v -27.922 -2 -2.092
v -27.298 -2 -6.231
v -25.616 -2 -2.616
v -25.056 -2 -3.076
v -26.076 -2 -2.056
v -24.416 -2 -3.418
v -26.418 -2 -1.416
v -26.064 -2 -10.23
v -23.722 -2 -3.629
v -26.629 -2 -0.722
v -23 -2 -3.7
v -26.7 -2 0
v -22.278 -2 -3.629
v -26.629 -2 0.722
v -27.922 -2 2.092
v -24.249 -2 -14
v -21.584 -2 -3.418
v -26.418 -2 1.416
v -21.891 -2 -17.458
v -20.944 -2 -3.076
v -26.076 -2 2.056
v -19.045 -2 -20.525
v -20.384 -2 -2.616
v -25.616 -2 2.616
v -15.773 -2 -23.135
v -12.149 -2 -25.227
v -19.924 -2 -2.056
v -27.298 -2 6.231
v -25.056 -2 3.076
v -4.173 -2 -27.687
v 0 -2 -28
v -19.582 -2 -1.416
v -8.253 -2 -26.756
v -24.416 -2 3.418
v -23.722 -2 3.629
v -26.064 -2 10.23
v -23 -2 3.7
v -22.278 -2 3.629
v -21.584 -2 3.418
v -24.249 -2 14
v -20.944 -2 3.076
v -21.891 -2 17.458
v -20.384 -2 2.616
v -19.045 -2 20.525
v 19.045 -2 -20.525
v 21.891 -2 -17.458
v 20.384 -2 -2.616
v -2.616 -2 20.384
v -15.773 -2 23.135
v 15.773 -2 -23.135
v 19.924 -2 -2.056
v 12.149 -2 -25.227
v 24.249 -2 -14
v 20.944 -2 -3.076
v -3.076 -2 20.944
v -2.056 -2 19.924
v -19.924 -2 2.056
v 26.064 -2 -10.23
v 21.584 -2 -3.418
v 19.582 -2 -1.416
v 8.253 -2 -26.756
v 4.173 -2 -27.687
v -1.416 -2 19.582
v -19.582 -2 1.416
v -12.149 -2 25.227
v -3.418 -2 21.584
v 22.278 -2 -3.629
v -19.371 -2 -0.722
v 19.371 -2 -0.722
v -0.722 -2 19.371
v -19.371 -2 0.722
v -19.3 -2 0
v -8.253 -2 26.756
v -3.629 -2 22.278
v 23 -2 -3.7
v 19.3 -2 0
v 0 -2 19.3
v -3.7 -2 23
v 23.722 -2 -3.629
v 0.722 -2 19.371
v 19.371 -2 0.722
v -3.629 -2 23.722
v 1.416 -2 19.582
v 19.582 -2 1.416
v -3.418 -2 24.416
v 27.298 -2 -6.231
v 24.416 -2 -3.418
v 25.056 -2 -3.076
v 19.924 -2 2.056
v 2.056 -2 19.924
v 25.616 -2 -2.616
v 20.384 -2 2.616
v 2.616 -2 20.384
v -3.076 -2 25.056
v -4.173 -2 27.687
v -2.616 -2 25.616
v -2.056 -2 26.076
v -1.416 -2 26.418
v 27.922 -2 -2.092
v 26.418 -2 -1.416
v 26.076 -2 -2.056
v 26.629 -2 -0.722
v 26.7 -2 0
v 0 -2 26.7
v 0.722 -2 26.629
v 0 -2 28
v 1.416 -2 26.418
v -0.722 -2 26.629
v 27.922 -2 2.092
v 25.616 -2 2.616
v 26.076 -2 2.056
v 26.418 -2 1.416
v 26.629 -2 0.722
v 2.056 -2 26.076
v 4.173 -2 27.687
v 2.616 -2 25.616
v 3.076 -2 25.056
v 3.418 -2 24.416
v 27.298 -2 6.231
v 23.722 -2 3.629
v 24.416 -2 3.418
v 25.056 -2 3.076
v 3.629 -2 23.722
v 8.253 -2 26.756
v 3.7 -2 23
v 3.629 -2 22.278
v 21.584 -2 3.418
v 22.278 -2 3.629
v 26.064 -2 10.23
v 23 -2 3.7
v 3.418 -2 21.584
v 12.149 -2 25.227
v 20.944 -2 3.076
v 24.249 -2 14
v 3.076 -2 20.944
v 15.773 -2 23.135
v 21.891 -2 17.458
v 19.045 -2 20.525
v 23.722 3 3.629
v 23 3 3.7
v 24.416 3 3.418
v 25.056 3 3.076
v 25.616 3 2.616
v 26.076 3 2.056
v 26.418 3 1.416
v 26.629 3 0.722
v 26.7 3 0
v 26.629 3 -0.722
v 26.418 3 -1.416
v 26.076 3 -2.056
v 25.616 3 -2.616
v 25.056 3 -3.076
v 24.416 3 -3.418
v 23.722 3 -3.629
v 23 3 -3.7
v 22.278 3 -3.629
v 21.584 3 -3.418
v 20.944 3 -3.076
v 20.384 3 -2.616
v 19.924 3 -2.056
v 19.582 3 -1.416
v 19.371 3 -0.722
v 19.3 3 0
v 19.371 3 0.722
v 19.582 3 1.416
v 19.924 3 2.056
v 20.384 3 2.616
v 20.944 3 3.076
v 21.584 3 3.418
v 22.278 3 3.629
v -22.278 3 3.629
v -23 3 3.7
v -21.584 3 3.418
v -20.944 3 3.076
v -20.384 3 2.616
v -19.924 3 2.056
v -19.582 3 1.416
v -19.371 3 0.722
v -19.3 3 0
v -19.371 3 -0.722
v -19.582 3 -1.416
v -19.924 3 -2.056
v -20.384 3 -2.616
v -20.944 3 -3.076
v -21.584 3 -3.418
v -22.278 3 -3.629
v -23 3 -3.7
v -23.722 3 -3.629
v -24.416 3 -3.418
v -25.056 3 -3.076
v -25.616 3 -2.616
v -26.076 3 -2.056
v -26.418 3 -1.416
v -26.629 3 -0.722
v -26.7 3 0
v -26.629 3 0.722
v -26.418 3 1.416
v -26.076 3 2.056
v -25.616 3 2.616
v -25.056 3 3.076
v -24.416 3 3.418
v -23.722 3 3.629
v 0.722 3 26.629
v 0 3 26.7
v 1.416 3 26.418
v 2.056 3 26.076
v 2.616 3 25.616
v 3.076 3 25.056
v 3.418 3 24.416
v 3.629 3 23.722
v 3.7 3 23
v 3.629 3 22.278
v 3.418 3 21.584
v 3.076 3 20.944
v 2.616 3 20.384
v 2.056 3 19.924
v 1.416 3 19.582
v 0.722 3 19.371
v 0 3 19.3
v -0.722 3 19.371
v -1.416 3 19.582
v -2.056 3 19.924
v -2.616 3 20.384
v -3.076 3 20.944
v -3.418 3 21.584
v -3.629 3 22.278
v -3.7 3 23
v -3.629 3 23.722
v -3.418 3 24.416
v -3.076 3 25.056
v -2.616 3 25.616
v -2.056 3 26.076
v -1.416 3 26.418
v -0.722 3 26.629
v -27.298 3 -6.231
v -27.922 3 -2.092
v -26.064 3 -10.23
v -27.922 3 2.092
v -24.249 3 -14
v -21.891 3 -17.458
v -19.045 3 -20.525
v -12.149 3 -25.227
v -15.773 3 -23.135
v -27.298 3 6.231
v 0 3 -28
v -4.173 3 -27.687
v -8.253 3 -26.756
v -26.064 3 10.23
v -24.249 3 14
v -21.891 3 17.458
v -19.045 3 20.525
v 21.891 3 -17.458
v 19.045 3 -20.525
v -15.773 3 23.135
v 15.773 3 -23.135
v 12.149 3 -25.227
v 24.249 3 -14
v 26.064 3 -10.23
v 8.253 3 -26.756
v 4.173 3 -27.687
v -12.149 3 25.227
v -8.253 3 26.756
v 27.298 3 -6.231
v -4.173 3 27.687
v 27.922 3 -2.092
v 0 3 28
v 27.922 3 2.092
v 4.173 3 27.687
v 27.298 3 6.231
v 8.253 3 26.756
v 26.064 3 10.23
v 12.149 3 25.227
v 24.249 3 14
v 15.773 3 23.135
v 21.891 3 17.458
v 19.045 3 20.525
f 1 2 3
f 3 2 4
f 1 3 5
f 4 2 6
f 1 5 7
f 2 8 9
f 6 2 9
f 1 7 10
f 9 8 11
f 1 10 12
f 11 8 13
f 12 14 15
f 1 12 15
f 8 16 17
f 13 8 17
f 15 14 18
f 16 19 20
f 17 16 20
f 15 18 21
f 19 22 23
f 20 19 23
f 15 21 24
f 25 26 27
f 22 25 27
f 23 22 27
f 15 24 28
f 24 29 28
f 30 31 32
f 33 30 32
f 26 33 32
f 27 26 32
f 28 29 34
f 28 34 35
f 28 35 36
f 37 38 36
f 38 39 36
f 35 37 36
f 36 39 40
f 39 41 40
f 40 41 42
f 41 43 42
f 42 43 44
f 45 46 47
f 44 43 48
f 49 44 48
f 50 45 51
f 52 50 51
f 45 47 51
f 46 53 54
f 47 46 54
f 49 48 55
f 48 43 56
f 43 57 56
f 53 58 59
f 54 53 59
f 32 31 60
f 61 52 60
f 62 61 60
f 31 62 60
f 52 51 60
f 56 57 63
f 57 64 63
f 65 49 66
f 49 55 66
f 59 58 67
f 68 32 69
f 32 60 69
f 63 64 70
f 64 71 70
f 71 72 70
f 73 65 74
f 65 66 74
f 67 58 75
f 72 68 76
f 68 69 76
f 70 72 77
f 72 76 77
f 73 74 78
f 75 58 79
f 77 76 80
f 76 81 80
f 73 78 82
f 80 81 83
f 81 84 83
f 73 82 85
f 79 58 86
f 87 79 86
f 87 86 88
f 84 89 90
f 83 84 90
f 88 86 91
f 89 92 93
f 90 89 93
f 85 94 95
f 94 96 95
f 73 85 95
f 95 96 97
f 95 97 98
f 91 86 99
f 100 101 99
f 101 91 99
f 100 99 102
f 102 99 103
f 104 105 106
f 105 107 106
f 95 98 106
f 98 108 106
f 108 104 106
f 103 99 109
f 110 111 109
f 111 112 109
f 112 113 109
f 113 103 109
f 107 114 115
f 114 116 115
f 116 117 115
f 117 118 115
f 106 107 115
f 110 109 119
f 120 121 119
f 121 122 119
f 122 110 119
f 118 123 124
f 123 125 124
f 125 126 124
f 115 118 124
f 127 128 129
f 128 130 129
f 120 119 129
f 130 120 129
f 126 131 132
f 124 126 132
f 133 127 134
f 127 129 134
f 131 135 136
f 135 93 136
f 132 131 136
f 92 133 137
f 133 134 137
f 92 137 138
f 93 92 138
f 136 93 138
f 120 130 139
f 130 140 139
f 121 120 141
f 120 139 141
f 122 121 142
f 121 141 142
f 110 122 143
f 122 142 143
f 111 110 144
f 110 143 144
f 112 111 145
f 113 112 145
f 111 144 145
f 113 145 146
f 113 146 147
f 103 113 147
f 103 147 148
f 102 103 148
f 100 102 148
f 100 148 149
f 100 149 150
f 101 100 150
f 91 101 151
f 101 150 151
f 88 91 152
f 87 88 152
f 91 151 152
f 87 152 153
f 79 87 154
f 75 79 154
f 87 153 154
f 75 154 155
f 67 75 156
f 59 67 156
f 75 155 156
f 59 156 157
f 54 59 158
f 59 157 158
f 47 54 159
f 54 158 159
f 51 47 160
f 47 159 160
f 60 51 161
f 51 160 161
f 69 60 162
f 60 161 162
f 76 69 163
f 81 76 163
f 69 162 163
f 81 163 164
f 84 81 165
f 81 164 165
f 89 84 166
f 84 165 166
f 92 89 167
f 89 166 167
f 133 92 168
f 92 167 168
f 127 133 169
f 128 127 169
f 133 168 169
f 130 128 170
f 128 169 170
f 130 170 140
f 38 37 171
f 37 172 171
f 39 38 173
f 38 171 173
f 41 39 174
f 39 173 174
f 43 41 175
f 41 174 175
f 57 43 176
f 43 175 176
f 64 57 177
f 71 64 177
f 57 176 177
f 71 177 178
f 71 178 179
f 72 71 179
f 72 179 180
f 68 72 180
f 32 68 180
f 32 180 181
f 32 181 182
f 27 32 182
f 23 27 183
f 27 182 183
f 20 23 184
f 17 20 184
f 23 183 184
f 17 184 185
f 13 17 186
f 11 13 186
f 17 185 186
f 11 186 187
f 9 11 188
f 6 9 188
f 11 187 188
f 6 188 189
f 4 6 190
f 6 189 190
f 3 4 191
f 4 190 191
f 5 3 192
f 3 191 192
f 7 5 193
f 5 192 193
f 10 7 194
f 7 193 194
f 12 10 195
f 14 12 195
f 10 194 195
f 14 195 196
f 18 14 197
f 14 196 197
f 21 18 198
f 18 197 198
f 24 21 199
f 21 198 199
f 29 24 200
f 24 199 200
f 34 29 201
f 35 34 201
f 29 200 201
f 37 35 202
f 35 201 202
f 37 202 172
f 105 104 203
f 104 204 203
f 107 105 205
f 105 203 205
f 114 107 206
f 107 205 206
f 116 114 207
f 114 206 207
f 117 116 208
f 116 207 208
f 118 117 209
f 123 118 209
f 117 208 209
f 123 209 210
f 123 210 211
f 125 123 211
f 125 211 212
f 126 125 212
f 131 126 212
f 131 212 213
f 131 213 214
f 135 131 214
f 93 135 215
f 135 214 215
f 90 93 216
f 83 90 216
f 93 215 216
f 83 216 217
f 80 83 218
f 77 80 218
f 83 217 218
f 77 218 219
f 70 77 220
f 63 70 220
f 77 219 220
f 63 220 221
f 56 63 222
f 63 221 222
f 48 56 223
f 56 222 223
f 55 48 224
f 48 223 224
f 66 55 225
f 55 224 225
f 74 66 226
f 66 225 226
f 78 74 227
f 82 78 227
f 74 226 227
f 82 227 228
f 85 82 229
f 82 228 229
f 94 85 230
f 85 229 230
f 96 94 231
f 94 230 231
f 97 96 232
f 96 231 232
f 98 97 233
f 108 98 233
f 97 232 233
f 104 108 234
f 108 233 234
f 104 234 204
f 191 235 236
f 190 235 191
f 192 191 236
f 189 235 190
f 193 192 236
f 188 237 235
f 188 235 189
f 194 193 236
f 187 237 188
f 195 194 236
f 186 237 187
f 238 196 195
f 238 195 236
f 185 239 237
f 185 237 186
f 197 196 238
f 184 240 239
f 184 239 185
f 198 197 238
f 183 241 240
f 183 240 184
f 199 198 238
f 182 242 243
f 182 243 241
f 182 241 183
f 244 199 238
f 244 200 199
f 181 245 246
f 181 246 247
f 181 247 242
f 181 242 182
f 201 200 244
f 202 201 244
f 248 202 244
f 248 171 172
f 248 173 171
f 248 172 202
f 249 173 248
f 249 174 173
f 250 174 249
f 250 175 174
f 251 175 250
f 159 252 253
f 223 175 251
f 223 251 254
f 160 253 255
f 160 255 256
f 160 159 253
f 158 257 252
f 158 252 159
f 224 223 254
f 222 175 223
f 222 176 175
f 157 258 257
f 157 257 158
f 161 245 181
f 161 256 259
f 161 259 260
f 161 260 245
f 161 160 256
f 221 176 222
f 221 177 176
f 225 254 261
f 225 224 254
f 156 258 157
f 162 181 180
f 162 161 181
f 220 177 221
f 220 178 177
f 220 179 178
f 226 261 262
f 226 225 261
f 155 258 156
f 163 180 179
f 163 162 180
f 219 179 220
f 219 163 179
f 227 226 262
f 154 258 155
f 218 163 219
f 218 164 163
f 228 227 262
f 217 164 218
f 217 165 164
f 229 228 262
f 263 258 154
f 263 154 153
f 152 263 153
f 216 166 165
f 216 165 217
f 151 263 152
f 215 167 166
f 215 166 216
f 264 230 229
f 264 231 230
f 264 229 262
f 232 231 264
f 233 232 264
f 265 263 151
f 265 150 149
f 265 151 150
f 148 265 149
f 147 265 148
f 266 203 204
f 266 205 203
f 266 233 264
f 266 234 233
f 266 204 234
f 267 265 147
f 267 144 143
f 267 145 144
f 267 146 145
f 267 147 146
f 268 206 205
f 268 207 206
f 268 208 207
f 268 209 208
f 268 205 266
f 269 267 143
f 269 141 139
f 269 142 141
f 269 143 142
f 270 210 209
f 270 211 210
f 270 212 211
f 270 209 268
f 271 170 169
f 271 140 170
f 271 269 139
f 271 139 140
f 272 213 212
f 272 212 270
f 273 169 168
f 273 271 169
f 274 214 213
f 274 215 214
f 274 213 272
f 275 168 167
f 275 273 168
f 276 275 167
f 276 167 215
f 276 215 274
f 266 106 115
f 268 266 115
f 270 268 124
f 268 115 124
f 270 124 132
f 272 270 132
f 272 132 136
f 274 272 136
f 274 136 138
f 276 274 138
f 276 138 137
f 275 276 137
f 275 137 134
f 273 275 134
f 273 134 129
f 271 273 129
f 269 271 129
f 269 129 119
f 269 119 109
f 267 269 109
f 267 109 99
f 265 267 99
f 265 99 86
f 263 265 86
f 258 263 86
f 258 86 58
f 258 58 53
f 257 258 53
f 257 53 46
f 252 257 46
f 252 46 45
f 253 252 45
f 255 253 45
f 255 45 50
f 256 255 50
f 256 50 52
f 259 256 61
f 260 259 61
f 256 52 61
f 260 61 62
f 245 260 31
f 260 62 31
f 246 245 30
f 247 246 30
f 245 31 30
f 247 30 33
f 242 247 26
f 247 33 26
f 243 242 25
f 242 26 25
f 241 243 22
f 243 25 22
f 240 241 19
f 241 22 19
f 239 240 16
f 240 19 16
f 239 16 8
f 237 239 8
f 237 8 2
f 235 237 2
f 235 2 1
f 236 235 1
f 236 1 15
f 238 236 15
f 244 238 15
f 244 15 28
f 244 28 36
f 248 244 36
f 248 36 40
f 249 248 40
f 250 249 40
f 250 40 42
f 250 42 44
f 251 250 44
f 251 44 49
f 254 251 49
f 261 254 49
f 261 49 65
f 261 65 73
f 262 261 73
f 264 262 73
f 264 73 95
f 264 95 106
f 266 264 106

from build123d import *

# Parameters (mm, degrees)
SKETCH_1_R          = 28
EXTRUDE_1_DEPTH     = 3
SKETCH_7_R          = 3.7
CUT_EXTRUDE_1_DEPTH = 10
SKETCH_8_R          = 3.7
CUT_EXTRUDE_2_DEPTH = 10
SKETCH_9_R          = 3.7
CUT_EXTRUDE_3_DEPTH = 10
EXTRUDE_START       = -2
SKETCH_1_3_R        = 28
EXTRUDE_3_DEPTH     = 2
SKETCH_9_2_R        = 3.7
CUT_EXTRUDE_4_DEPTH = 5
SKETCH_8_2_R        = 3.7
CUT_EXTRUDE_5_DEPTH = 5
SKETCH_7_2_R        = 3.7
CUT_EXTRUDE_6_DEPTH = 5


with BuildPart() as part:
    # 草图1 → 凸台-拉伸1 (new body)
    with BuildSketch(Plane(origin=(0, 0, 0), x_dir=(1, 0, 0), z_dir=(0, 1, 0))):
        Circle(SKETCH_1_R)
    extrude(amount=EXTRUDE_1_DEPTH)

    # 草图7 → 切除-拉伸1 (cut)
    with BuildSketch(Plane(origin=(0, 3, 0), x_dir=(1, 0, 0), z_dir=(0, 1, 0))):
        with Locations((23, 0)):
            Circle(SKETCH_7_R)
    extrude(amount=-CUT_EXTRUDE_1_DEPTH, mode=Mode.SUBTRACT)

    # 草图8 → 切除-拉伸2 (cut)
    with BuildSketch(Plane(origin=(0, 3, 0), x_dir=(1, 0, 0), z_dir=(0, 1, 0))):
        with Locations((-23, 0)):
            Circle(SKETCH_8_R)
    extrude(amount=-CUT_EXTRUDE_2_DEPTH, mode=Mode.SUBTRACT)

    # 草图9 → 切除-拉伸3 (cut)
    with BuildSketch(Plane(origin=(0, 3, 0), x_dir=(1, 0, 0), z_dir=(0, 1, 0))):
        with Locations((0, -23)):
            Circle(SKETCH_9_R)
    extrude(amount=-CUT_EXTRUDE_3_DEPTH, mode=Mode.SUBTRACT)

    # 草图1<3> → 凸台-拉伸3 (add)
    with BuildSketch(Plane(origin=(0, 0, 0), x_dir=(1, 0, 0), z_dir=(0, 1, 0)).offset(EXTRUDE_START)):
        Circle(SKETCH_1_3_R)
    extrude(amount=EXTRUDE_3_DEPTH)

    # 草图9<2> → 切除-拉伸4 (cut)
    with BuildSketch(Plane(origin=(0, 3, 0), x_dir=(1, 0, 0), z_dir=(0, 1, 0))):
        with Locations((0, -23)):
            Circle(SKETCH_9_2_R)
    extrude(amount=-CUT_EXTRUDE_4_DEPTH, mode=Mode.SUBTRACT)

    # 草图8<2> → 切除-拉伸5 (cut)
    with BuildSketch(Plane(origin=(0, 3, 0), x_dir=(1, 0, 0), z_dir=(0, 1, 0))):
        with Locations((-23, 0)):
            Circle(SKETCH_8_2_R)
    extrude(amount=-CUT_EXTRUDE_5_DEPTH, mode=Mode.SUBTRACT)

    # 草图7<2> → 切除-拉伸6 (cut)
    with BuildSketch(Plane(origin=(0, 3, 0), x_dir=(1, 0, 0), z_dir=(0, 1, 0))):
        with Locations((23, 0)):
            Circle(SKETCH_7_2_R)
    extrude(amount=-CUT_EXTRUDE_6_DEPTH, mode=Mode.SUBTRACT)


solid = part.part
